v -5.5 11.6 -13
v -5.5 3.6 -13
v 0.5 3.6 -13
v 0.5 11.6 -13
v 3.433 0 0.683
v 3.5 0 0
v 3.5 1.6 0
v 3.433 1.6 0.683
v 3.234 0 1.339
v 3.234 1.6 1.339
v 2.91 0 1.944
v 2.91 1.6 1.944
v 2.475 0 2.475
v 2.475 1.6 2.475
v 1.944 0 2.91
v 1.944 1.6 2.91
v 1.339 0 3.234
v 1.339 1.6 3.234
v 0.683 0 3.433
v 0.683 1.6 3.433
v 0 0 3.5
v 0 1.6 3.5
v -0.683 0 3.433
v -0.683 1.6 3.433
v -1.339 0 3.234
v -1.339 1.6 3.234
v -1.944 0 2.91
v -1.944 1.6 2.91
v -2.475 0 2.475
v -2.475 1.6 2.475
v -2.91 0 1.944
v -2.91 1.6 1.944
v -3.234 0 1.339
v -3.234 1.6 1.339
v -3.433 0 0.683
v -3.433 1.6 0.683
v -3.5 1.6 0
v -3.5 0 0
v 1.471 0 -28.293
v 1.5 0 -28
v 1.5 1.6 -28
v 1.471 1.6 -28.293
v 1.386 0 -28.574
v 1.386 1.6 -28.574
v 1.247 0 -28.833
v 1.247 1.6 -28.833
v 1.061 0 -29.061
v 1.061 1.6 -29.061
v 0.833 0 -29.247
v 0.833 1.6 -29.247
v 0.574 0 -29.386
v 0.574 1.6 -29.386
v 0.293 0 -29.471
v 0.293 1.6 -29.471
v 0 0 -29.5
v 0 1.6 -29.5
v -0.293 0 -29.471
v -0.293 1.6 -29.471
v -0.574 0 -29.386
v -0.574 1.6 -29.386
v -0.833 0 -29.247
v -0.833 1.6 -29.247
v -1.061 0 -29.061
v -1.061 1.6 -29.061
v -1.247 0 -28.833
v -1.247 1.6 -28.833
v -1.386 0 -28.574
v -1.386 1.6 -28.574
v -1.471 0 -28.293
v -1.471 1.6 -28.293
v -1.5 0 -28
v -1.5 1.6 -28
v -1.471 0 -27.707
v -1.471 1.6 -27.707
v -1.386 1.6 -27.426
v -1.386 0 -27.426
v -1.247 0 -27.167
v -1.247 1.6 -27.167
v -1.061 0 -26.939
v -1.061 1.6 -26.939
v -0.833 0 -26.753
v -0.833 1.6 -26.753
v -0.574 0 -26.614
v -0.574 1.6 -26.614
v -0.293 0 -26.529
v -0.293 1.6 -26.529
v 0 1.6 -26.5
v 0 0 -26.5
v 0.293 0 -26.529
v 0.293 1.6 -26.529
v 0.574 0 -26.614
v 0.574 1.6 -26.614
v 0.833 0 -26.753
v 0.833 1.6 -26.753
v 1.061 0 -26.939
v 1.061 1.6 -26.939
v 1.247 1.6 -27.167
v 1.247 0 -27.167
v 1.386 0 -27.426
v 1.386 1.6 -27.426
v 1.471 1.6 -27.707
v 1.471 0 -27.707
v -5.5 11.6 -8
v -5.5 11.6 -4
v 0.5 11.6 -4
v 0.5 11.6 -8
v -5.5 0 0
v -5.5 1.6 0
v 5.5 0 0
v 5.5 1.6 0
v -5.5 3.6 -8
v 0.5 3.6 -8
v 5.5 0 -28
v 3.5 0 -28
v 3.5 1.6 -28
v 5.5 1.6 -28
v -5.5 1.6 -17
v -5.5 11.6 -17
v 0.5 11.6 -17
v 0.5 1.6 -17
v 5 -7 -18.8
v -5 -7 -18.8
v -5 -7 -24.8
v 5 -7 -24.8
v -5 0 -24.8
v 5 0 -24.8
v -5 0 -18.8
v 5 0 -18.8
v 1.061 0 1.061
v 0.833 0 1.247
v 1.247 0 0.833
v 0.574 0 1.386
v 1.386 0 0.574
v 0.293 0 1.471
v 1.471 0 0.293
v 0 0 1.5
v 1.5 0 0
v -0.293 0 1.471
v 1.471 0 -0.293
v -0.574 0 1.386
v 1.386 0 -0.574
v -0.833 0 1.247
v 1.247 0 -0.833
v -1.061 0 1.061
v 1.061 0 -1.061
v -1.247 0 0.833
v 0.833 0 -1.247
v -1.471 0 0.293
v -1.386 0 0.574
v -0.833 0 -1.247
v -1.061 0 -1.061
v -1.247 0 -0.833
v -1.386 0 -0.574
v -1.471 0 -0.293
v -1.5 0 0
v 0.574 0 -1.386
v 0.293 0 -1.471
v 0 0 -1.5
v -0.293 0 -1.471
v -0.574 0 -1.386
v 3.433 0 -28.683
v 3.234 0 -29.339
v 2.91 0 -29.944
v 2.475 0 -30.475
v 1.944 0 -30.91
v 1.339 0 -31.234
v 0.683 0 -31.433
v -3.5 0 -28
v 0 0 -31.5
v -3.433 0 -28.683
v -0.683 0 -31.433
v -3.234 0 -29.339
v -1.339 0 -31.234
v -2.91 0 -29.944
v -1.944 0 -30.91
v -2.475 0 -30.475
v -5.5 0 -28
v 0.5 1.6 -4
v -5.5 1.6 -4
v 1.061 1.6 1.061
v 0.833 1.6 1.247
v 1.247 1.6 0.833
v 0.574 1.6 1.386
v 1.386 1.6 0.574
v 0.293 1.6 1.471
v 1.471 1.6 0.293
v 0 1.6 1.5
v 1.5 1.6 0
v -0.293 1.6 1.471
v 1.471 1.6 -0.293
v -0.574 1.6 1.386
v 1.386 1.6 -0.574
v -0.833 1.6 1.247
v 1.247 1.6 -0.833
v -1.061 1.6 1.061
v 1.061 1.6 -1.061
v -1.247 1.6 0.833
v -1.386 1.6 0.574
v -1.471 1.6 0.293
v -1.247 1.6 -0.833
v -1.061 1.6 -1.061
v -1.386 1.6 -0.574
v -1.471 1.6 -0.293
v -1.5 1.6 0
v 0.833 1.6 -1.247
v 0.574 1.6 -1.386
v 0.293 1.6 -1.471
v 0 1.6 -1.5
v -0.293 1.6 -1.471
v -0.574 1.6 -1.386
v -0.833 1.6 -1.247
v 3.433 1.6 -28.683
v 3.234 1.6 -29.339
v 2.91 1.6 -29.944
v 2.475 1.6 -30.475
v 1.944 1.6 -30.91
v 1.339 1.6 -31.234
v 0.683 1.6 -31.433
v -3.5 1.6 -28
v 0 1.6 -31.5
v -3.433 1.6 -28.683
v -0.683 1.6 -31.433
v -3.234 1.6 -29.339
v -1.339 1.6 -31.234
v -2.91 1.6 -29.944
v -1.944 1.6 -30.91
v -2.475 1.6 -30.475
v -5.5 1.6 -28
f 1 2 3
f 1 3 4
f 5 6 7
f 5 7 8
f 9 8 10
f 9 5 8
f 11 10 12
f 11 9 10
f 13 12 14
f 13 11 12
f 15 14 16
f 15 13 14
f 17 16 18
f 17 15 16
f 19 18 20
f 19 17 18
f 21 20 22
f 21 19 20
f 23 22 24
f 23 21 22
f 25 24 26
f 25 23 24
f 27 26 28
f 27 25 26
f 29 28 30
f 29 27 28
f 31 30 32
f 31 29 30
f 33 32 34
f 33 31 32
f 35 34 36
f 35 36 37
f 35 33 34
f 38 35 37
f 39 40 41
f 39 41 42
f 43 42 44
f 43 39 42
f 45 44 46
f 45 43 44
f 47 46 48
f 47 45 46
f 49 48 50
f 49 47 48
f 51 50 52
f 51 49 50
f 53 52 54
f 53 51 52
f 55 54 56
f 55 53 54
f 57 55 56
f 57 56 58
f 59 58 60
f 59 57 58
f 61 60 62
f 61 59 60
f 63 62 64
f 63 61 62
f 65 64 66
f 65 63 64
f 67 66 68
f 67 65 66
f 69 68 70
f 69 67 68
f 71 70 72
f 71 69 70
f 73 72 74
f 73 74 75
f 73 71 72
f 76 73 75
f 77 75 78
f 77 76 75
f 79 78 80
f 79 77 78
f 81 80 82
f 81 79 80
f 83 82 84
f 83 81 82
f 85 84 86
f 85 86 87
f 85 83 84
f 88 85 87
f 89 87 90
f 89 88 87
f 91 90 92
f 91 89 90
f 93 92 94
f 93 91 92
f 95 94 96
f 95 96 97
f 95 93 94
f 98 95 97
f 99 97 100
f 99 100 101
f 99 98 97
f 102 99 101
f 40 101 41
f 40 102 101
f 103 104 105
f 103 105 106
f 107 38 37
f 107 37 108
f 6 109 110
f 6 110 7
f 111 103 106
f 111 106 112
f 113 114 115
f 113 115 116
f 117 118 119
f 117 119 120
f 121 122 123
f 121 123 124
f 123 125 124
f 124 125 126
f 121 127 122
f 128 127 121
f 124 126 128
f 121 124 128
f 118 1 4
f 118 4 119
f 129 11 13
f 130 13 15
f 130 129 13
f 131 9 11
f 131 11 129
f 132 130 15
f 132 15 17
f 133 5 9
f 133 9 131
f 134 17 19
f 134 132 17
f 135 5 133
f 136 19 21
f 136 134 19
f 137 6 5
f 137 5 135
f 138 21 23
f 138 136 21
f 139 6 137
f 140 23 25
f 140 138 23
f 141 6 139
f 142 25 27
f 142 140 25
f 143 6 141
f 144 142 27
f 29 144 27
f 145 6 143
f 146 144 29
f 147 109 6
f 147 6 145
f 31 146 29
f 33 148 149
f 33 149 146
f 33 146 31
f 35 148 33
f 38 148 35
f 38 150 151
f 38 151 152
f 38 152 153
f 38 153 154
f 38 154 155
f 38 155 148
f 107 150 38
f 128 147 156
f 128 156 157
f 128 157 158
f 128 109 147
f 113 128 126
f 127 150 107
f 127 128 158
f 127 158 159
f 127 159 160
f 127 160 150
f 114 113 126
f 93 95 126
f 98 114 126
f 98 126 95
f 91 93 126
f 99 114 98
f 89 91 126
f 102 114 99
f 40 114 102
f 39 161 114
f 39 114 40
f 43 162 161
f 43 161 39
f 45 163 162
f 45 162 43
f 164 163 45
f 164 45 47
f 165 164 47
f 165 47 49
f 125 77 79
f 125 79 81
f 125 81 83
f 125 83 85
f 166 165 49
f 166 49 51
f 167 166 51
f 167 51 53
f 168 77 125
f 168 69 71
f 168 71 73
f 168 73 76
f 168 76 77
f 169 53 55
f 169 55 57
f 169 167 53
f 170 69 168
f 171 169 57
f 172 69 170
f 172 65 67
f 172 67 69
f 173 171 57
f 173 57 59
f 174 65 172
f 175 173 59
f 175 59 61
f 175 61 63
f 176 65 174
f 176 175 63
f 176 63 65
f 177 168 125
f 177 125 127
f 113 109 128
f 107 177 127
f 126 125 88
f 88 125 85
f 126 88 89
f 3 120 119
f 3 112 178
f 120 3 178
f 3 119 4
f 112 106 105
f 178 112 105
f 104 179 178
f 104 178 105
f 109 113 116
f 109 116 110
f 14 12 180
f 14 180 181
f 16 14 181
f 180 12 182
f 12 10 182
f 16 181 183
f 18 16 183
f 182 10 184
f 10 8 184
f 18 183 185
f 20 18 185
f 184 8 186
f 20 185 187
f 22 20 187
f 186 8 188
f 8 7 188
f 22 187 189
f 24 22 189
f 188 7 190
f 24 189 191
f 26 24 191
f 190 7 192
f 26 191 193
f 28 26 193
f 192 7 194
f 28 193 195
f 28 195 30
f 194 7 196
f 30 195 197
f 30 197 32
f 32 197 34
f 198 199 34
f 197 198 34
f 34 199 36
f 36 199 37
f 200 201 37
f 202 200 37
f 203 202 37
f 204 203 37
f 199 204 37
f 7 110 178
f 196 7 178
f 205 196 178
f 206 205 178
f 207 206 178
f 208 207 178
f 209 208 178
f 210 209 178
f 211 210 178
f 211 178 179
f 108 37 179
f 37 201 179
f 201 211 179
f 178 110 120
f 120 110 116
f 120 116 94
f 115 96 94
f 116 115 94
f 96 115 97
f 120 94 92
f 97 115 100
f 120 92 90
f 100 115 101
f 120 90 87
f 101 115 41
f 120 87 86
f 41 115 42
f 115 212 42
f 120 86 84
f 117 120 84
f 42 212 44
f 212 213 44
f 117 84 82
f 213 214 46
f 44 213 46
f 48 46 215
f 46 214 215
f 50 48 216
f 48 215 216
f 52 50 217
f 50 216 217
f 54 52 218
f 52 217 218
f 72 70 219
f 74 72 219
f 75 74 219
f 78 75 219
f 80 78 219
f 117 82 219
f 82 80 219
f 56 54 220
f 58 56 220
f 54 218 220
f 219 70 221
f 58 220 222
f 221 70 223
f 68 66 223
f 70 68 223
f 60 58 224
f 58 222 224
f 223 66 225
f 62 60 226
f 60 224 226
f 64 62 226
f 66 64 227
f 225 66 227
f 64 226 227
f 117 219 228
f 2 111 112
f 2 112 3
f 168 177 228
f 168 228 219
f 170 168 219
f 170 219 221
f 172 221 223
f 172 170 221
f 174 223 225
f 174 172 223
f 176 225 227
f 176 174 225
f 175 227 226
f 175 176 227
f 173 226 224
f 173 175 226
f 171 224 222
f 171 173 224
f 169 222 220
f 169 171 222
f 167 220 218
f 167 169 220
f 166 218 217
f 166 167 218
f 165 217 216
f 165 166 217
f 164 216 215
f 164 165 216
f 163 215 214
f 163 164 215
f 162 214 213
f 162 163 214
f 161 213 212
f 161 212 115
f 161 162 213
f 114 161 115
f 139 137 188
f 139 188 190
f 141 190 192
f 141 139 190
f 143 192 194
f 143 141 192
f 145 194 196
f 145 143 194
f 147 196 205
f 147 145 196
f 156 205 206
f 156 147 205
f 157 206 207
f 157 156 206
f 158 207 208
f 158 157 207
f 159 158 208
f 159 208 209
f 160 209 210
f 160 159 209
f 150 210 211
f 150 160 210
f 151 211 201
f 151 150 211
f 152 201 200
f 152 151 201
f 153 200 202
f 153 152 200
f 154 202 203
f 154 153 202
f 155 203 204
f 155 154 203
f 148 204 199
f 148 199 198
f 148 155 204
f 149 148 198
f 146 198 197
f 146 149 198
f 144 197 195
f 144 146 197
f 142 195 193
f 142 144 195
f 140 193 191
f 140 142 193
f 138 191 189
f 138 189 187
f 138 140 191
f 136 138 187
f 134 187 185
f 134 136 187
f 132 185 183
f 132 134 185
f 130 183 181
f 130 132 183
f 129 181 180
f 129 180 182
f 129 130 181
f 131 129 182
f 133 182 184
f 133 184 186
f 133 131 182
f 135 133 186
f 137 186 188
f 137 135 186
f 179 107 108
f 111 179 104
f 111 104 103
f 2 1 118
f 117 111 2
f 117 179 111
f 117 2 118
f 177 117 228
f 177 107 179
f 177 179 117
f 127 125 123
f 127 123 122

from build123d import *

# Parameters (mm, degrees)
SKETCH1_R           = 1.5
BOSS_EXTRUDE1_DEPTH = 1.6
BOSS_EXTRUDE2_START = -11
BOSS_EXTRUDE2_DEPTH = 6
SKETCH5_W           = 10
SKETCH5_H           = 6
BOSS_EXTRUDE3_DEPTH = 7


with BuildPart() as part:
    # Sketch1 → Boss-Extrude1 (new body)
    with BuildSketch(Plane(origin=(0, 0, 0), x_dir=(1, 0, 0), z_dir=(0, 1, 0))):
        with BuildLine():
            Line((-5.5, 28), (-3.5, 28))
            ThreePointArc((-3.5, 28), (0, 31.5), (3.5, 28))
            Line((3.5, 28), (5.5, 28))
            Line((5.5, 28), (5.5, 0))
            Line((5.5, 0), (3.5, 0))
            ThreePointArc((3.5, 0), (0, -3.5), (-3.5, 0))
            Line((-3.5, 0), (-5.5, 0))
            Line((-5.5, 0), (-5.5, 28))
        make_face()
        Circle(SKETCH1_R, mode=Mode.SUBTRACT)
        with Locations((0, 28)):
            Circle(SKETCH1_R, mode=Mode.SUBTRACT)
    extrude(amount=BOSS_EXTRUDE1_DEPTH)

    # Sketch3 → Boss-Extrude2 (add)
    with BuildSketch(Plane(origin=(5.5, 0, 0), x_dir=(0, 0, -1), z_dir=(1, 0, 0)).offset(BOSS_EXTRUDE2_START)):
        Polygon((4, 1.6), (4, 11.6), (8, 11.6), (8, 3.6), (13, 3.6), (13, 11.6), (17, 11.6), (17, 1.6), align=None)
    extrude(amount=BOSS_EXTRUDE2_DEPTH)

    # Sketch5 → Boss-Extrude3 (add)
    with BuildSketch(Plane.XZ):
        with Locations((0, -21.8)):
            Rectangle(SKETCH5_W, SKETCH5_H)
    extrude(amount=BOSS_EXTRUDE3_DEPTH)


solid = part.part
